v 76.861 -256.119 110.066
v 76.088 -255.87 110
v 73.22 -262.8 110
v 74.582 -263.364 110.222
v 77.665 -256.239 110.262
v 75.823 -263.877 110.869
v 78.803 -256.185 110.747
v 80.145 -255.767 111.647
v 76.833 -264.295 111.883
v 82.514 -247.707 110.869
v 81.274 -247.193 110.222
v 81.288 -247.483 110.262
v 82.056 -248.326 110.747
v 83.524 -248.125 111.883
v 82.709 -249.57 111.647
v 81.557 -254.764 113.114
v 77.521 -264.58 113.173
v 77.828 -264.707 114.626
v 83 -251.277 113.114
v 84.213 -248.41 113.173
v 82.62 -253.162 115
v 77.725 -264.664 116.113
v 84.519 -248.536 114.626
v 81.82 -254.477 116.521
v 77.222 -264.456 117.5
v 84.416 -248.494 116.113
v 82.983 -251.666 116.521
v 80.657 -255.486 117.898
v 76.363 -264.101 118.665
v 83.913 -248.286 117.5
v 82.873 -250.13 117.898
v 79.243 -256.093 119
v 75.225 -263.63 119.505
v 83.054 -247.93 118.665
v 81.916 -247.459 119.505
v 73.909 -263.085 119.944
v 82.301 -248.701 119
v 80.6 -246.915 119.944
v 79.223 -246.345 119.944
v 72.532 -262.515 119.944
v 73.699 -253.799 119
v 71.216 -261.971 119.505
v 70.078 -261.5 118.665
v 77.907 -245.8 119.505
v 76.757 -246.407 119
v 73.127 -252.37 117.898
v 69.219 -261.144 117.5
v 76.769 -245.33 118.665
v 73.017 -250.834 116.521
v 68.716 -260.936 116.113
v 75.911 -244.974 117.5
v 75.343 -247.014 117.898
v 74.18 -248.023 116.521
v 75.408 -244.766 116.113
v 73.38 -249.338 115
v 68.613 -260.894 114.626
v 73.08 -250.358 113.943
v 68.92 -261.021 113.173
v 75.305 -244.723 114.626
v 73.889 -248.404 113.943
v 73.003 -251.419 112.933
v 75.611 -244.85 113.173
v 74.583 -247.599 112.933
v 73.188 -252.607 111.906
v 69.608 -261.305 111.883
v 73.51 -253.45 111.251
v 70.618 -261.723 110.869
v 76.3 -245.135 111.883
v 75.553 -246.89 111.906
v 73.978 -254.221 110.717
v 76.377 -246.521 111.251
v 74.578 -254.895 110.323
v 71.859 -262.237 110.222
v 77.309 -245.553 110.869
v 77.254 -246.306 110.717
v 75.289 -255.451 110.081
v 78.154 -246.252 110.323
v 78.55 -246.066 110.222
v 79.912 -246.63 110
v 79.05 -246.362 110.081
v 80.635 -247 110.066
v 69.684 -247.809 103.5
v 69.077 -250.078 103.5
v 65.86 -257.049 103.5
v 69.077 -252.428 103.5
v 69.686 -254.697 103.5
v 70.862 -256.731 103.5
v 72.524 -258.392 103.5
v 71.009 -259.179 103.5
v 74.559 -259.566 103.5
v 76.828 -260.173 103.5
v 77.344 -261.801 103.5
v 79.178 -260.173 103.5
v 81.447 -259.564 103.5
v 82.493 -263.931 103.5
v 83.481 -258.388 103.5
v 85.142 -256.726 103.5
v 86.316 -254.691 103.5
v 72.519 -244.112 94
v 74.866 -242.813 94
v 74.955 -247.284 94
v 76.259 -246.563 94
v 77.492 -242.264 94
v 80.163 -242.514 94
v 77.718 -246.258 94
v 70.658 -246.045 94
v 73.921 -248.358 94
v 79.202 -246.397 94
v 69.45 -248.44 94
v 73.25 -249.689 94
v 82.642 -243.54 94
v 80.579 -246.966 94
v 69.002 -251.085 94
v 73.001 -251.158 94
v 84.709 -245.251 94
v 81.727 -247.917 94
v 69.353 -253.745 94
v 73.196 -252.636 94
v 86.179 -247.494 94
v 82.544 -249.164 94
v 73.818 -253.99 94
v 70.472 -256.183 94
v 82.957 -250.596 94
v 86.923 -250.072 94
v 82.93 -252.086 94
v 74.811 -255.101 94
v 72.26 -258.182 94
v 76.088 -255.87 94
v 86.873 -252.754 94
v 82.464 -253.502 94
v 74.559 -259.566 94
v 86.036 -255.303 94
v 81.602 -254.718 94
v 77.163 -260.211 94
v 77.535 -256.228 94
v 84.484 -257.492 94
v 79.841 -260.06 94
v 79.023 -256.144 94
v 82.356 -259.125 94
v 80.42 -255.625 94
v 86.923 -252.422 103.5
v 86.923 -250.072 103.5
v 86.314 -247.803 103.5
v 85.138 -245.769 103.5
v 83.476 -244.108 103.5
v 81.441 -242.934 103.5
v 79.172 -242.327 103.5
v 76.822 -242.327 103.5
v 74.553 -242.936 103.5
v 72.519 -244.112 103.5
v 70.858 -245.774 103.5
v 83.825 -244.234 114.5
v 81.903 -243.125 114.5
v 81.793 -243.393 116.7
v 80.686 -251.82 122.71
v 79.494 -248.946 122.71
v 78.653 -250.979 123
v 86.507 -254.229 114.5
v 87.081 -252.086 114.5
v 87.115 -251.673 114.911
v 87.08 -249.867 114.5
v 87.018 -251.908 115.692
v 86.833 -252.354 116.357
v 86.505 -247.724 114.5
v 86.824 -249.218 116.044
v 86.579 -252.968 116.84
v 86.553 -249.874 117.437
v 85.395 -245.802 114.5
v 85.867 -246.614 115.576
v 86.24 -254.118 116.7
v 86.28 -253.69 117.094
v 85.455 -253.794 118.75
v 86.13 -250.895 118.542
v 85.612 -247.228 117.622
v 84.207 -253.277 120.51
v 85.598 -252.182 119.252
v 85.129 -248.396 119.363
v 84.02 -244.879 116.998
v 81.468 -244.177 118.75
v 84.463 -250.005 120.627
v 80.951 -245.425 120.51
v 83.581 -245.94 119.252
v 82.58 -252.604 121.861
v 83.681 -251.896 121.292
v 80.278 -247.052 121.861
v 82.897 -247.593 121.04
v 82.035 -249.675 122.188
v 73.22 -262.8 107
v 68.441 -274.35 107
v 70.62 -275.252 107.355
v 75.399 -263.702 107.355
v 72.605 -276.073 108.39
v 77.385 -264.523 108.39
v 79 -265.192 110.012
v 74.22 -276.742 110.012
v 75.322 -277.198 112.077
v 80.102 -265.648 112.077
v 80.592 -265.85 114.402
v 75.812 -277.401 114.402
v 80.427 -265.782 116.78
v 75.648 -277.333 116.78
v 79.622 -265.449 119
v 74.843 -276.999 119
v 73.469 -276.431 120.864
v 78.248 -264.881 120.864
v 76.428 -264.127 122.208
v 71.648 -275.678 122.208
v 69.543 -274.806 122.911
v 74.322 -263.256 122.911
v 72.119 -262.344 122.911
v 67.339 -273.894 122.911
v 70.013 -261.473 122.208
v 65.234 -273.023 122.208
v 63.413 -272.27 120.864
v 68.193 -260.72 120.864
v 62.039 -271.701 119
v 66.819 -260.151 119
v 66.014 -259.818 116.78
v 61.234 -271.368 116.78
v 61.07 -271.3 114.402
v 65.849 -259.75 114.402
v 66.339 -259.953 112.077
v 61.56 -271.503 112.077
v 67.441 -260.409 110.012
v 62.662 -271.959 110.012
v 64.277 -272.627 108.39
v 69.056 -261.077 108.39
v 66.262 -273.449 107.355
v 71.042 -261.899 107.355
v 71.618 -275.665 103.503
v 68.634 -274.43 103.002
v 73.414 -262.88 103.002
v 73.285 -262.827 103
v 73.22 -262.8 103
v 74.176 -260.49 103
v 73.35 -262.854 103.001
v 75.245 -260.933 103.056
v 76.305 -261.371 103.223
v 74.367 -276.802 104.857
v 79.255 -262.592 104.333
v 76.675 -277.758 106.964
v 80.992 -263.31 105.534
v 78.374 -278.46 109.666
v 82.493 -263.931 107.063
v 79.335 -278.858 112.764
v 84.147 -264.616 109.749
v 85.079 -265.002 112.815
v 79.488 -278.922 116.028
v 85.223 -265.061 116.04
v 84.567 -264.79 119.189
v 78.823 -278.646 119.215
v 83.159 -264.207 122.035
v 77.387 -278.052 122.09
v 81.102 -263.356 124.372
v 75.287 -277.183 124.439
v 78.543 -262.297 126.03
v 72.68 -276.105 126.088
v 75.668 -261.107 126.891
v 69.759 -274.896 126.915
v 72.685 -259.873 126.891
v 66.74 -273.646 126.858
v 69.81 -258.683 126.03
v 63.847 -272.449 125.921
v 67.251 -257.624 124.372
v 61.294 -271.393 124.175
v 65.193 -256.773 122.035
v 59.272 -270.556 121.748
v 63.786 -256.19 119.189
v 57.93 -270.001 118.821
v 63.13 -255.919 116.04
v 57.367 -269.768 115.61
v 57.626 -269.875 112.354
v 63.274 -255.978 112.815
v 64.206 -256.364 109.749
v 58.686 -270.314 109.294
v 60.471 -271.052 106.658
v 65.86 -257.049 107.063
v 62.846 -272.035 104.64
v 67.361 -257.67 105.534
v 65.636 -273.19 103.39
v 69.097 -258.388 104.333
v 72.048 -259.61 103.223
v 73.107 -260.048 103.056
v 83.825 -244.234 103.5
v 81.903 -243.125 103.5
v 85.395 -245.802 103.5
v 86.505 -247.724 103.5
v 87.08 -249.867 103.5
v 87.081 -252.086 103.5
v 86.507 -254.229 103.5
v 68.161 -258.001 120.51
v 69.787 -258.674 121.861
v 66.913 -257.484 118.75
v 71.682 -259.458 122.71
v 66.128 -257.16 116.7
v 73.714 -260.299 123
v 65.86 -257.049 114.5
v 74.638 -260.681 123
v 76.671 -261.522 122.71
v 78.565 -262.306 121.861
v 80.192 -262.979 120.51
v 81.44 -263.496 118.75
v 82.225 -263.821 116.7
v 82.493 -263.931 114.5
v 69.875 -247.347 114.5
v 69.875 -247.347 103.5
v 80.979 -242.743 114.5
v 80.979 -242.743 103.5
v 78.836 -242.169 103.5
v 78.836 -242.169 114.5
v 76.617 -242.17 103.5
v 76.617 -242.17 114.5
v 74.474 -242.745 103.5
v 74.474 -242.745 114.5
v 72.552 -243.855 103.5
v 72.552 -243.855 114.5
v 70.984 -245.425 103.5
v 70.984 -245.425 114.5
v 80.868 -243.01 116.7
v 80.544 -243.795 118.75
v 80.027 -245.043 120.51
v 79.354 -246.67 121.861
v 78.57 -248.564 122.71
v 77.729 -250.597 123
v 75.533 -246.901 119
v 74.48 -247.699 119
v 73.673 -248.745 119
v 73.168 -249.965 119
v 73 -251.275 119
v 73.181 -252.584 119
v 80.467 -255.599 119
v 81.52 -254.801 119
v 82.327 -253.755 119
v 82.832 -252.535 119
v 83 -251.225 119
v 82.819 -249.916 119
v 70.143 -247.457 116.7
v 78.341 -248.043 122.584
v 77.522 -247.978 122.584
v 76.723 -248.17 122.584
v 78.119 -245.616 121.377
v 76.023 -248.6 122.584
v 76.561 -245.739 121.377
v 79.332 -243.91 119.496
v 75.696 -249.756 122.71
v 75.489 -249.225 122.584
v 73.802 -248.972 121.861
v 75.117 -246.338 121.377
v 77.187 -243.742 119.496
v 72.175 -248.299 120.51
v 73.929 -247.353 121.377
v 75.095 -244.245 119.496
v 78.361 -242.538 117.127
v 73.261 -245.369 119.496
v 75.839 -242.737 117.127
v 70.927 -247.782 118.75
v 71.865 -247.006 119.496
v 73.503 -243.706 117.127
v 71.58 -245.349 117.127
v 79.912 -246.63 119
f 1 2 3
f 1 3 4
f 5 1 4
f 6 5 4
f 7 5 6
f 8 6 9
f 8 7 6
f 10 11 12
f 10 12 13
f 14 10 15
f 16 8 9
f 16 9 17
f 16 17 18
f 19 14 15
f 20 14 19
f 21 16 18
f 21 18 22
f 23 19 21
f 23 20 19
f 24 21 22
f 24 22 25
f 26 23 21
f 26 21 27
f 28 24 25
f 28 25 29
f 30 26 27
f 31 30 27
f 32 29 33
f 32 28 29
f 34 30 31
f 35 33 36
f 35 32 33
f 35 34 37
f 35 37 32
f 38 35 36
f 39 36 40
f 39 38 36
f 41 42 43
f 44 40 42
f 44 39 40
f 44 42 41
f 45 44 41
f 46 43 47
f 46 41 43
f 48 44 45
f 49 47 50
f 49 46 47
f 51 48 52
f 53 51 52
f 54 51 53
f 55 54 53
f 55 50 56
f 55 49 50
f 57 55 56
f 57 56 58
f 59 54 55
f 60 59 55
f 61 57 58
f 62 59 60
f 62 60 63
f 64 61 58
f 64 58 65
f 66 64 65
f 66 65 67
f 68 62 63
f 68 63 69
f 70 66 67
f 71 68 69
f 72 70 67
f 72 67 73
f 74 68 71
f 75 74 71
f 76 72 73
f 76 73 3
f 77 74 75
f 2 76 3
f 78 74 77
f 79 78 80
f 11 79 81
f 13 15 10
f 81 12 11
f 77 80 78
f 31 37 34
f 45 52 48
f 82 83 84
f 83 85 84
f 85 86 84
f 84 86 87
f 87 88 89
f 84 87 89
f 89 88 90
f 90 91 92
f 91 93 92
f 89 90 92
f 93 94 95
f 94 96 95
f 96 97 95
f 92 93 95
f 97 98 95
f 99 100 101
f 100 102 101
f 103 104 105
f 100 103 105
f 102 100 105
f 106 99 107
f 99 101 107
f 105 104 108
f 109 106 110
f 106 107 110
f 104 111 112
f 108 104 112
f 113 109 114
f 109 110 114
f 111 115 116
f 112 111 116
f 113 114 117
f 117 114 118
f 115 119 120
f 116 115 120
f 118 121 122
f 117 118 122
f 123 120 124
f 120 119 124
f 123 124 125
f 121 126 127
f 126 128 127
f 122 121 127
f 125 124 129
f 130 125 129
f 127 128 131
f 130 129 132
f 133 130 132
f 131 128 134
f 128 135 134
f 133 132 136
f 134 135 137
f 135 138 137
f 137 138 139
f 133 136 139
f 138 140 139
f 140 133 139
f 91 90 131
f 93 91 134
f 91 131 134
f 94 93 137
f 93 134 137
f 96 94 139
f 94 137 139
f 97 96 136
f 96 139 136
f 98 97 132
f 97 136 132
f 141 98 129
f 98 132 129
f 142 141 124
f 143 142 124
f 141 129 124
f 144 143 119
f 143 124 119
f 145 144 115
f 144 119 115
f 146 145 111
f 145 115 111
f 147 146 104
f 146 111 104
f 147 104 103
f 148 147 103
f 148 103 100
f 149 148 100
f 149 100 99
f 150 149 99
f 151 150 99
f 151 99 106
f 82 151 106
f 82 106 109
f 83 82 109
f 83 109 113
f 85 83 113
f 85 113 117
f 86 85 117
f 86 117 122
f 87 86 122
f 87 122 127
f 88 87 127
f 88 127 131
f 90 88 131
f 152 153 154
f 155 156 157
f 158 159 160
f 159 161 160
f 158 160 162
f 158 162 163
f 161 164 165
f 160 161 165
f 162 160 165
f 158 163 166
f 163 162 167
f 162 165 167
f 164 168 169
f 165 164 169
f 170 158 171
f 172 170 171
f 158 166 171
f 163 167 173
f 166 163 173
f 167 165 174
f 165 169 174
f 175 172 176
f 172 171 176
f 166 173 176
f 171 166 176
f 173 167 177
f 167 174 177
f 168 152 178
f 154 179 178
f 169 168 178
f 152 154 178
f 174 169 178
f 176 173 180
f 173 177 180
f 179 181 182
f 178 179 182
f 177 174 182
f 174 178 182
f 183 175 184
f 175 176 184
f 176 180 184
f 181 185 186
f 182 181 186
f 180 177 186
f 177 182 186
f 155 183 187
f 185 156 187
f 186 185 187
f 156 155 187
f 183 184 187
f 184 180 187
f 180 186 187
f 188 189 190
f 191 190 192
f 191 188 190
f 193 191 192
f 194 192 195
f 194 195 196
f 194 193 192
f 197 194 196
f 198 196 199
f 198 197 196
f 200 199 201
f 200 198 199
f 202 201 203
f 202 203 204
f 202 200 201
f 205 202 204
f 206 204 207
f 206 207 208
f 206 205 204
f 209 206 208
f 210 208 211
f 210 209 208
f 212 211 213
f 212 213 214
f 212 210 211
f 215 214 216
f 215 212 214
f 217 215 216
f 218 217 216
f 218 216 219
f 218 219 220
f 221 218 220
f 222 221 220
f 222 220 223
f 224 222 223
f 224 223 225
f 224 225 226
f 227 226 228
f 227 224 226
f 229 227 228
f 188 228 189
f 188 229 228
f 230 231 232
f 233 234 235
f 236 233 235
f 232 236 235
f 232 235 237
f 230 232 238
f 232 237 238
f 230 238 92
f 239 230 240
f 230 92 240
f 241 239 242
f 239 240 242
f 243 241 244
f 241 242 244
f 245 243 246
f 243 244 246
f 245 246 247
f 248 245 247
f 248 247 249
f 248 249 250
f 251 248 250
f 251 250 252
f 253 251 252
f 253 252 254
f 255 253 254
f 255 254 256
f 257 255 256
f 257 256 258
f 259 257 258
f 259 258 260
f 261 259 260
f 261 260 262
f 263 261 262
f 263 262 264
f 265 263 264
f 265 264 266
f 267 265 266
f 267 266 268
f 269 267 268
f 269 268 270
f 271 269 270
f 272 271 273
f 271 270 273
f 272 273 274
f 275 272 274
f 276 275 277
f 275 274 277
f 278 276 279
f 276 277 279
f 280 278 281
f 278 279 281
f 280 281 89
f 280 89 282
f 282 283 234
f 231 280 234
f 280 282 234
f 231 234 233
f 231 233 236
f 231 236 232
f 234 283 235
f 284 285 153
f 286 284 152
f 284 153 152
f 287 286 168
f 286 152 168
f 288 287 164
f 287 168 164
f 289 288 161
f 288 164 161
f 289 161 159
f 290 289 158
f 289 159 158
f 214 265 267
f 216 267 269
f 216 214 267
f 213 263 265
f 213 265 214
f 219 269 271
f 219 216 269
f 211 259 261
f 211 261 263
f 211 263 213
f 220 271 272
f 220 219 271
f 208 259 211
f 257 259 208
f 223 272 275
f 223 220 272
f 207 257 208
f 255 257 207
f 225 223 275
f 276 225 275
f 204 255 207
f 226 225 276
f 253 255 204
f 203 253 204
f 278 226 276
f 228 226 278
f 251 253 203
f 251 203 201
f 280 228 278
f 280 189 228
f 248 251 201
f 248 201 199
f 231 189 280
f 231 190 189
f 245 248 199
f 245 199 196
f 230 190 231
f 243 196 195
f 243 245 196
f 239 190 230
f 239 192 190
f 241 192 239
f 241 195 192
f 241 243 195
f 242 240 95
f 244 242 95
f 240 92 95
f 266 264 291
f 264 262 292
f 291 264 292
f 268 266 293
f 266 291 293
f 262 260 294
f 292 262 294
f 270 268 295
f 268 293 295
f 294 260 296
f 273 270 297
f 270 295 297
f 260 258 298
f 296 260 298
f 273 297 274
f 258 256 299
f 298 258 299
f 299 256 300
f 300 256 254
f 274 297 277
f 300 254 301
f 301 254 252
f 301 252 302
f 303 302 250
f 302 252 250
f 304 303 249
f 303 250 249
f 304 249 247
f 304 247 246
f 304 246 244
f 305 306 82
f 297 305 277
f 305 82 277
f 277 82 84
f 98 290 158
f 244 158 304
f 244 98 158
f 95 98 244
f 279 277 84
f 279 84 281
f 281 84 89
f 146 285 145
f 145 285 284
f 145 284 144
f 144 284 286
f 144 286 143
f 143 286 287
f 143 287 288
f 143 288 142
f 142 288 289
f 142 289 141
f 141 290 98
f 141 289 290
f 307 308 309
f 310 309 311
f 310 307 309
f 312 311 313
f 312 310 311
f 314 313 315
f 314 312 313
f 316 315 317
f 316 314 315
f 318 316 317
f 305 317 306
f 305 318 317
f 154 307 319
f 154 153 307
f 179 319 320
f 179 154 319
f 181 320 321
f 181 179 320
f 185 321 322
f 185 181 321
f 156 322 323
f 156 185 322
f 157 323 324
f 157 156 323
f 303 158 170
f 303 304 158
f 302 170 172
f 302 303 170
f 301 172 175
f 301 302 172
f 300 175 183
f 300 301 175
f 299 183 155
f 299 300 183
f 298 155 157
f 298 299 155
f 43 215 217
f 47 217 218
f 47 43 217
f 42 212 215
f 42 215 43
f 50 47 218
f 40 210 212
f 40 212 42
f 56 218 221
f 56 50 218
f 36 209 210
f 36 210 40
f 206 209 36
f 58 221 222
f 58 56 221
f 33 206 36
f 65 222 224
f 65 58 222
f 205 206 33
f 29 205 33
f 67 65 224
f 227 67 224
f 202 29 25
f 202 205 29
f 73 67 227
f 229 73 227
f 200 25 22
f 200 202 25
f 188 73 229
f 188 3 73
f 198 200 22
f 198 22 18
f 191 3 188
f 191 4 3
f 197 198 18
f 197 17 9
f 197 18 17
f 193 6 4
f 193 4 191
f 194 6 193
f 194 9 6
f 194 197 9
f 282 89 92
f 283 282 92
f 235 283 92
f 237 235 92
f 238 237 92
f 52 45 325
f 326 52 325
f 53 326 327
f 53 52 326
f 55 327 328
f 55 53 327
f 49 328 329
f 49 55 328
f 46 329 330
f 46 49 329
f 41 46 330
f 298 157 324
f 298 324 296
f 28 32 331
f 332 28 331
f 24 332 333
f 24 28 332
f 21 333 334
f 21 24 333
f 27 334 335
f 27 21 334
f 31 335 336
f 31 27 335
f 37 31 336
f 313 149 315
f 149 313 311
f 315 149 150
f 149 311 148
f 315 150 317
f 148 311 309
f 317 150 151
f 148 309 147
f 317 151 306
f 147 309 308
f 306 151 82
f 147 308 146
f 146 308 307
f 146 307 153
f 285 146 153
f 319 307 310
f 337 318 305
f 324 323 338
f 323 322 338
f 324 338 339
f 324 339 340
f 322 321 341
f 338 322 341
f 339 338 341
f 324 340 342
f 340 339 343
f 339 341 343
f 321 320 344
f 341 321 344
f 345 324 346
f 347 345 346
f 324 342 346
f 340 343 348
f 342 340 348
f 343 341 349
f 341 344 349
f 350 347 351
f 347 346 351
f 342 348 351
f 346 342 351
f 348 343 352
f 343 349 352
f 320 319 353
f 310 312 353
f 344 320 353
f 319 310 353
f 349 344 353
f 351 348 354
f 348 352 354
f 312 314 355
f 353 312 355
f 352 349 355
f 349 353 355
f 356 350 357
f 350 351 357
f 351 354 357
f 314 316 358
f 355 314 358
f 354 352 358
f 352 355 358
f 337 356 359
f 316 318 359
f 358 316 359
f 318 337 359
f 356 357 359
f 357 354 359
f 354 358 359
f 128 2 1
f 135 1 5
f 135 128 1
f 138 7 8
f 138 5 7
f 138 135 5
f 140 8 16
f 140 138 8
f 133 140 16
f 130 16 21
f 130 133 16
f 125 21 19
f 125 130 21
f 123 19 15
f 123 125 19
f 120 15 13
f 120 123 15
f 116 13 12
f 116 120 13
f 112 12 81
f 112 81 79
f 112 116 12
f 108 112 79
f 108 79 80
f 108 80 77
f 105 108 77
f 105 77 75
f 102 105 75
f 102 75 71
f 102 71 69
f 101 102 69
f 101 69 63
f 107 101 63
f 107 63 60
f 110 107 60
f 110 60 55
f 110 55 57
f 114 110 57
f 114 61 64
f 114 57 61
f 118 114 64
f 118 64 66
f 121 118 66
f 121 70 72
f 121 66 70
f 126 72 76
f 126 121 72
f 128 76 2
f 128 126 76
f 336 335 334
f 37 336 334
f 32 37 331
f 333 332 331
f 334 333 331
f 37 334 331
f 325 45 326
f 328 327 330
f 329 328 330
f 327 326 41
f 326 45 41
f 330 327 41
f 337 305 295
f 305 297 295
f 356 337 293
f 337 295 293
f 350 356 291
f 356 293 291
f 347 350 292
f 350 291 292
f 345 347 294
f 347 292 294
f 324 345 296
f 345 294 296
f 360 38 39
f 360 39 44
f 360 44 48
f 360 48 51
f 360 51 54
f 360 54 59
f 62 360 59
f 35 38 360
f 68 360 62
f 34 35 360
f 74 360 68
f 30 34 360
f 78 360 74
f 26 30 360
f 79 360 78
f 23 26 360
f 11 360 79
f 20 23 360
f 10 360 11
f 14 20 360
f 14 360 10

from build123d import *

# Parameters (mm, degrees)
CYLINDER021_R               = 5
CYLINDER021_DEPTH           = 25
CYLINDER022_R               = 5
CYLINDER022_DEPTH           = 15
CYLINDER020_R               = 9
CYLINDER020_DEPTH           = 9.5
BOX007_W                    = 19
BOX007_H                    = 18
BOX007_DEPTH                = 19.5
FILLET_R                    = 8.5
CYLINDER024_R               = 5
CYLINDER024_DEPTH           = 2.5
CYLINDER019_R               = 12
CYLINDER019_DEPTH           = 2.5
CYLINDER027_R               = 8
CYLINDER027_DEPTH           = 12.5
CYLINDER026_R               = 12
CYLINDER026_DEPTH           = 12.5
CYLINDER026_PLACEMENT_ANGLE = 1
FUSION025_PLACEMENT_ANGLE   = 90
FUSION032_PLACEMENT_ANGLE   = 112.48


with BuildPart() as tc_bottom_hole:
    # Cylinder021 → Cylinder021 (new body)
    with BuildSketch(Plane.XY):
        Circle(CYLINDER021_R)
    extrude(amount=CYLINDER021_DEPTH)


with BuildPart() as tc_holes:
    # Cylinder022 → Cylinder022 (new body)
    with BuildSketch(Plane(origin=(-5, 0, 21), x_dir=(0, 0, -1), z_dir=(1, 0, 0))):
        Circle(CYLINDER022_R)
    extrude(amount=CYLINDER022_DEPTH)

    # Fusion016: union TC-Bottom-Hole
    add(tc_bottom_hole.part)


with BuildPart() as tc_bottom:
    # Cylinder020 → Cylinder020 (new body)
    with BuildSketch(Plane.XY):
        Circle(CYLINDER020_R)
    extrude(amount=CYLINDER020_DEPTH)


with BuildPart() as turnablecorner002:
    # Box007 → Box007 (new body)
    with BuildSketch(Plane(origin=(-9, -9, 9.5), x_dir=(1, 0, 0), z_dir=(0, 0, 1))):
        with Locations((9.5, 9)):
            Rectangle(BOX007_W, BOX007_H)
    extrude(amount=BOX007_DEPTH)

    # Fillet
    fillet_edges = [turnablecorner002.edges().sort_by_distance(p)[0] for p in [
        (-9, -9, 19.25),
        (-9, 0, 29),
        (-9, 9, 19.25),
        (0.5, -9, 29),
        (0.5, 9, 29),
    ]]
    fillet(fillet_edges, radius=FILLET_R)

    # Fusion018: union TC-Bottom
    add(tc_bottom.part)

    # Cut013: cut TC-Holes
    add(tc_holes.part, mode=Mode.SUBTRACT)


with BuildPart() as largeplughole:
    # Cylinder024 → Cylinder024 (new body)
    with BuildSketch(Plane.XY):
        Circle(CYLINDER024_R)
    extrude(amount=CYLINDER024_DEPTH)


with BuildPart() as largeplugbase001:
    # Cylinder019 → Cylinder019 (new body)
    with BuildSketch(Plane.XY):
        Circle(CYLINDER019_R)
    extrude(amount=CYLINDER019_DEPTH)

    # Cut008: cut LargePlugHole
    add(largeplughole.part, mode=Mode.SUBTRACT)


with BuildPart() as largeplugwallhole:
    # Cylinder027 → Cylinder027 (new body)
    with BuildSketch(Plane.XY.offset(2.5)):
        Circle(CYLINDER027_R)
    extrude(amount=CYLINDER027_DEPTH)


with BuildPart() as gpu1_in_adapter:
    # Cylinder026 → Cylinder026 (new body)
    with BuildSketch(Plane.XY):
        Circle(CYLINDER026_R)
    extrude(amount=CYLINDER026_DEPTH)


with BuildPart() as gpu1_in_adapter_1:
    # Cylinder026 placement: moved
    add(gpu1_in_adapter.part.moved(Location((0, 0, 2.5))).rotate(Axis((0, 0, 2.5), (0, 0, 1)), CYLINDER026_PLACEMENT_ANGLE))

    # Cut007: cut LargePlugWallHole
    add(largeplugwallhole.part, mode=Mode.SUBTRACT)

    # Fusion025: union LargePlugBase001
    add(largeplugbase001.part)


with BuildPart() as gpu1_in_adapter_2:
    # Fusion025 placement: moved
    add(gpu1_in_adapter_1.part.moved(Location((10, 0, 21))).rotate(Axis((10, 0, 21), (0, 1, 0)), FUSION025_PLACEMENT_ANGLE))

    # Fusion032: union TurnableCorner002
    add(turnablecorner002.part)


with BuildPart() as gpu1_in_adapter_3:
    # Fusion032 placement: moved
    add(gpu1_in_adapter_2.part.moved(Location((78, -251.25, 94))).rotate(Axis((78, -251.25, 94), (0, 0, -1)), FUSION032_PLACEMENT_ANGLE))


solid = gpu1_in_adapter_3.part
